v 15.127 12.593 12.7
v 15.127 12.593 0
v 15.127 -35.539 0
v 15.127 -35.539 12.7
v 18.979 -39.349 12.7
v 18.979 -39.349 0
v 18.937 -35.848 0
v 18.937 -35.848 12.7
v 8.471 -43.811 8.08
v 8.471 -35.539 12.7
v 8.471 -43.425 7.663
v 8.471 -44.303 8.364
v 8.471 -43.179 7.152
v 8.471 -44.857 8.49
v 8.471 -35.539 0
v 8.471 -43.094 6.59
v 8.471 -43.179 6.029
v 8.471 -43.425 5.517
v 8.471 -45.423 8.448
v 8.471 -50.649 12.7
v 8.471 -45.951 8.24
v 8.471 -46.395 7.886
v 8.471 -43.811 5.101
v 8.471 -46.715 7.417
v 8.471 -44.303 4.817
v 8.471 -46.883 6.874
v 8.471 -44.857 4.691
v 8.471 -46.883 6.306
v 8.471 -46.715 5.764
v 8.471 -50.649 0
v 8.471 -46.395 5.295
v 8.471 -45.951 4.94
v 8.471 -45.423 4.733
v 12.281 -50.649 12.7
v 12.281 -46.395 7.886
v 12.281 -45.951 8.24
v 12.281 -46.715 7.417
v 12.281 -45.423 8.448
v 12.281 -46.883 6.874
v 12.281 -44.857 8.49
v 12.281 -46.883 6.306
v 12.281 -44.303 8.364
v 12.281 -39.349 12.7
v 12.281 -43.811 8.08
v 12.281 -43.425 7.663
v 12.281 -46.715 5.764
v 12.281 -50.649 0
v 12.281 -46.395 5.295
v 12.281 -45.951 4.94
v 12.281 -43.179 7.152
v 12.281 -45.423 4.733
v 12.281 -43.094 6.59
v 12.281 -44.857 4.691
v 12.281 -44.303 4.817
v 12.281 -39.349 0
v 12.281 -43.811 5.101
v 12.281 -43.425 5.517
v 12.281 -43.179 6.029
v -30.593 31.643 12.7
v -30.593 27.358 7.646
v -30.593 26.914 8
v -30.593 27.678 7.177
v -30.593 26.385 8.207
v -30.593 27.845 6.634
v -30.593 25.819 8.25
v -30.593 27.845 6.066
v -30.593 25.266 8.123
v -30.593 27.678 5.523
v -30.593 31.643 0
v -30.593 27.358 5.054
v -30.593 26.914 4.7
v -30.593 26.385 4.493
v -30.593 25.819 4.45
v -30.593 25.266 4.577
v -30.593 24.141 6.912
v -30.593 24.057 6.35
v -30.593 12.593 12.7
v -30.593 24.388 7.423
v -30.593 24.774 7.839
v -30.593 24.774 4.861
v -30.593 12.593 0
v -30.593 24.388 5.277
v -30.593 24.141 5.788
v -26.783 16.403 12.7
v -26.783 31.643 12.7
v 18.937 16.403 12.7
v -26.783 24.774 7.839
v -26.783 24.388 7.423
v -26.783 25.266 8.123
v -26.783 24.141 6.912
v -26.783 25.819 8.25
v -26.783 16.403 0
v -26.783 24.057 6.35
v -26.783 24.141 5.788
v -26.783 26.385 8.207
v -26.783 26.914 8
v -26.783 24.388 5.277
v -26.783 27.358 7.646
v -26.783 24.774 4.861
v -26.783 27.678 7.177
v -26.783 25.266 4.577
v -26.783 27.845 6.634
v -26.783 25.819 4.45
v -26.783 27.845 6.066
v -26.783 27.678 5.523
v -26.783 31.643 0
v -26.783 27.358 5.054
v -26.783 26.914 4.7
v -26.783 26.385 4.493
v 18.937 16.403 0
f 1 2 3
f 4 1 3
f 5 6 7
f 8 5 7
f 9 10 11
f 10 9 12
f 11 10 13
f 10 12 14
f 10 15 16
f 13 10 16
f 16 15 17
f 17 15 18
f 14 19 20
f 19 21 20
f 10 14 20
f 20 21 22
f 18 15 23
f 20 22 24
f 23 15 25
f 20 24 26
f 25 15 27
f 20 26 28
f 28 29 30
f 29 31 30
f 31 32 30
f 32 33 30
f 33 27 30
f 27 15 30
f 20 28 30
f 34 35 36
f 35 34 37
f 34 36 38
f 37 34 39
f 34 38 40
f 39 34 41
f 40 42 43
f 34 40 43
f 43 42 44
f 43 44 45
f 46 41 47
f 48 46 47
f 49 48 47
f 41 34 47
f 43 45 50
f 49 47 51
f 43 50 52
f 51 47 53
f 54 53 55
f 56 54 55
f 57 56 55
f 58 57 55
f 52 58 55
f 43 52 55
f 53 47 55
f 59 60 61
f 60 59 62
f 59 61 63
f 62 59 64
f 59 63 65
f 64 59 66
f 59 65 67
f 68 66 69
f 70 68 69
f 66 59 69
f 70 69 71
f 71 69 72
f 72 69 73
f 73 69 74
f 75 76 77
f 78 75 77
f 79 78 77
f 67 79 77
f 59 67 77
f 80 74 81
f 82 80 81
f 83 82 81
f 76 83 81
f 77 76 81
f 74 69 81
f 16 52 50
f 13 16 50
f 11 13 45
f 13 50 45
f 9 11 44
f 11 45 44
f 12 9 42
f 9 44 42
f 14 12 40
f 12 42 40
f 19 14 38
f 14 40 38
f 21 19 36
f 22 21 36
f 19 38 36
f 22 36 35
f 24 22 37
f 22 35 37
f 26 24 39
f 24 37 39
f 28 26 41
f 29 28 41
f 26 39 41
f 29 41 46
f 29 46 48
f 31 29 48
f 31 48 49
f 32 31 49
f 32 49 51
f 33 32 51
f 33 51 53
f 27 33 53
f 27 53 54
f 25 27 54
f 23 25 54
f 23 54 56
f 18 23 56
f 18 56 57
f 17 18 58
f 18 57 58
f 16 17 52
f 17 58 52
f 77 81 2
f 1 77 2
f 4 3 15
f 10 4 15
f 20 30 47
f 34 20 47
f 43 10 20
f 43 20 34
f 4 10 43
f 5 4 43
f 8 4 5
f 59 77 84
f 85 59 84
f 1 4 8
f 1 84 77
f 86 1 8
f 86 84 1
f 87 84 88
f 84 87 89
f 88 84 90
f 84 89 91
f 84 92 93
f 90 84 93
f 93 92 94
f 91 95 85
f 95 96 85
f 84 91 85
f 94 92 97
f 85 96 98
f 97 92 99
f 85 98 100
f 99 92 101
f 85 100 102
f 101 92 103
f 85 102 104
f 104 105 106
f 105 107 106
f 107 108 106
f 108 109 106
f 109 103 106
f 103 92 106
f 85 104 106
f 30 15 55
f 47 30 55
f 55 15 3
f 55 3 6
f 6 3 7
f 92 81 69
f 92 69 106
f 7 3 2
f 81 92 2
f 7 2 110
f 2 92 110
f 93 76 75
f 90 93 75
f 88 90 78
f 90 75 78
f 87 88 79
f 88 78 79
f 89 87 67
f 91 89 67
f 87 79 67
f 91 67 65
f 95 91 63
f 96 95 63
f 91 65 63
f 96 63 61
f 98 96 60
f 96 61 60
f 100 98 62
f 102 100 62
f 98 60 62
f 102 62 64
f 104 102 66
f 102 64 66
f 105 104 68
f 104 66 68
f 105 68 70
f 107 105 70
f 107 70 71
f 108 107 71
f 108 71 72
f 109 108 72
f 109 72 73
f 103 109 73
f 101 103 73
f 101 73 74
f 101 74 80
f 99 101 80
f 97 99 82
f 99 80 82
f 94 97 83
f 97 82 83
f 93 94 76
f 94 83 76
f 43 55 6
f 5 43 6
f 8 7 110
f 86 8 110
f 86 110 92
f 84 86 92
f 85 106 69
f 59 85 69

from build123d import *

# Parameters (mm, degrees)
F1_DEPTH = 12.7
F2_R     = 1.905
F3_DEPTH = 3.81
F4_R     = 1.905
F5_DEPTH = 3.81


with BuildPart() as f1:
    # F0 (on Top) → F1 (new body)
    with BuildSketch(Plane.XY):
        Polygon((18.936607, 16.403033), (-26.783393, 16.403033), (-26.783393, 31.643033), (-30.593393, 31.643033), (-30.593393, 16.403033), (-30.593393, 12.593033), (15.126607, 12.593033), (15.126607, -35.539288), (8.47132, -35.539288), (8.47132, -39.349288), (8.47132, -50.648663), (12.28132, -50.648663), (12.28132, -39.349288), (18.979067, -39.349288), (18.936607, -35.848397), (18.936607, 12.593033), align=None)
    extrude(amount=F1_DEPTH)

    # F2 (on face) → F3 (cut, through all)
    with BuildSketch(Plane.YZ.offset(12.28132)):
        with Locations((-44.998975, 6.59027)):
            Circle(F2_R)
    extrude(amount=-F3_DEPTH, mode=Mode.SUBTRACT)

    # F4 (on face) → F5 (cut, through all)
    with BuildSketch(Plane(origin=(-30.593393, 0, 0), x_dir=(0, -1, 0), z_dir=(-1, 0, 0))):
        with Locations((-25.961572, 6.35)):
            Circle(F4_R)
    extrude(amount=-F5_DEPTH, mode=Mode.SUBTRACT)


solid = f1.part
